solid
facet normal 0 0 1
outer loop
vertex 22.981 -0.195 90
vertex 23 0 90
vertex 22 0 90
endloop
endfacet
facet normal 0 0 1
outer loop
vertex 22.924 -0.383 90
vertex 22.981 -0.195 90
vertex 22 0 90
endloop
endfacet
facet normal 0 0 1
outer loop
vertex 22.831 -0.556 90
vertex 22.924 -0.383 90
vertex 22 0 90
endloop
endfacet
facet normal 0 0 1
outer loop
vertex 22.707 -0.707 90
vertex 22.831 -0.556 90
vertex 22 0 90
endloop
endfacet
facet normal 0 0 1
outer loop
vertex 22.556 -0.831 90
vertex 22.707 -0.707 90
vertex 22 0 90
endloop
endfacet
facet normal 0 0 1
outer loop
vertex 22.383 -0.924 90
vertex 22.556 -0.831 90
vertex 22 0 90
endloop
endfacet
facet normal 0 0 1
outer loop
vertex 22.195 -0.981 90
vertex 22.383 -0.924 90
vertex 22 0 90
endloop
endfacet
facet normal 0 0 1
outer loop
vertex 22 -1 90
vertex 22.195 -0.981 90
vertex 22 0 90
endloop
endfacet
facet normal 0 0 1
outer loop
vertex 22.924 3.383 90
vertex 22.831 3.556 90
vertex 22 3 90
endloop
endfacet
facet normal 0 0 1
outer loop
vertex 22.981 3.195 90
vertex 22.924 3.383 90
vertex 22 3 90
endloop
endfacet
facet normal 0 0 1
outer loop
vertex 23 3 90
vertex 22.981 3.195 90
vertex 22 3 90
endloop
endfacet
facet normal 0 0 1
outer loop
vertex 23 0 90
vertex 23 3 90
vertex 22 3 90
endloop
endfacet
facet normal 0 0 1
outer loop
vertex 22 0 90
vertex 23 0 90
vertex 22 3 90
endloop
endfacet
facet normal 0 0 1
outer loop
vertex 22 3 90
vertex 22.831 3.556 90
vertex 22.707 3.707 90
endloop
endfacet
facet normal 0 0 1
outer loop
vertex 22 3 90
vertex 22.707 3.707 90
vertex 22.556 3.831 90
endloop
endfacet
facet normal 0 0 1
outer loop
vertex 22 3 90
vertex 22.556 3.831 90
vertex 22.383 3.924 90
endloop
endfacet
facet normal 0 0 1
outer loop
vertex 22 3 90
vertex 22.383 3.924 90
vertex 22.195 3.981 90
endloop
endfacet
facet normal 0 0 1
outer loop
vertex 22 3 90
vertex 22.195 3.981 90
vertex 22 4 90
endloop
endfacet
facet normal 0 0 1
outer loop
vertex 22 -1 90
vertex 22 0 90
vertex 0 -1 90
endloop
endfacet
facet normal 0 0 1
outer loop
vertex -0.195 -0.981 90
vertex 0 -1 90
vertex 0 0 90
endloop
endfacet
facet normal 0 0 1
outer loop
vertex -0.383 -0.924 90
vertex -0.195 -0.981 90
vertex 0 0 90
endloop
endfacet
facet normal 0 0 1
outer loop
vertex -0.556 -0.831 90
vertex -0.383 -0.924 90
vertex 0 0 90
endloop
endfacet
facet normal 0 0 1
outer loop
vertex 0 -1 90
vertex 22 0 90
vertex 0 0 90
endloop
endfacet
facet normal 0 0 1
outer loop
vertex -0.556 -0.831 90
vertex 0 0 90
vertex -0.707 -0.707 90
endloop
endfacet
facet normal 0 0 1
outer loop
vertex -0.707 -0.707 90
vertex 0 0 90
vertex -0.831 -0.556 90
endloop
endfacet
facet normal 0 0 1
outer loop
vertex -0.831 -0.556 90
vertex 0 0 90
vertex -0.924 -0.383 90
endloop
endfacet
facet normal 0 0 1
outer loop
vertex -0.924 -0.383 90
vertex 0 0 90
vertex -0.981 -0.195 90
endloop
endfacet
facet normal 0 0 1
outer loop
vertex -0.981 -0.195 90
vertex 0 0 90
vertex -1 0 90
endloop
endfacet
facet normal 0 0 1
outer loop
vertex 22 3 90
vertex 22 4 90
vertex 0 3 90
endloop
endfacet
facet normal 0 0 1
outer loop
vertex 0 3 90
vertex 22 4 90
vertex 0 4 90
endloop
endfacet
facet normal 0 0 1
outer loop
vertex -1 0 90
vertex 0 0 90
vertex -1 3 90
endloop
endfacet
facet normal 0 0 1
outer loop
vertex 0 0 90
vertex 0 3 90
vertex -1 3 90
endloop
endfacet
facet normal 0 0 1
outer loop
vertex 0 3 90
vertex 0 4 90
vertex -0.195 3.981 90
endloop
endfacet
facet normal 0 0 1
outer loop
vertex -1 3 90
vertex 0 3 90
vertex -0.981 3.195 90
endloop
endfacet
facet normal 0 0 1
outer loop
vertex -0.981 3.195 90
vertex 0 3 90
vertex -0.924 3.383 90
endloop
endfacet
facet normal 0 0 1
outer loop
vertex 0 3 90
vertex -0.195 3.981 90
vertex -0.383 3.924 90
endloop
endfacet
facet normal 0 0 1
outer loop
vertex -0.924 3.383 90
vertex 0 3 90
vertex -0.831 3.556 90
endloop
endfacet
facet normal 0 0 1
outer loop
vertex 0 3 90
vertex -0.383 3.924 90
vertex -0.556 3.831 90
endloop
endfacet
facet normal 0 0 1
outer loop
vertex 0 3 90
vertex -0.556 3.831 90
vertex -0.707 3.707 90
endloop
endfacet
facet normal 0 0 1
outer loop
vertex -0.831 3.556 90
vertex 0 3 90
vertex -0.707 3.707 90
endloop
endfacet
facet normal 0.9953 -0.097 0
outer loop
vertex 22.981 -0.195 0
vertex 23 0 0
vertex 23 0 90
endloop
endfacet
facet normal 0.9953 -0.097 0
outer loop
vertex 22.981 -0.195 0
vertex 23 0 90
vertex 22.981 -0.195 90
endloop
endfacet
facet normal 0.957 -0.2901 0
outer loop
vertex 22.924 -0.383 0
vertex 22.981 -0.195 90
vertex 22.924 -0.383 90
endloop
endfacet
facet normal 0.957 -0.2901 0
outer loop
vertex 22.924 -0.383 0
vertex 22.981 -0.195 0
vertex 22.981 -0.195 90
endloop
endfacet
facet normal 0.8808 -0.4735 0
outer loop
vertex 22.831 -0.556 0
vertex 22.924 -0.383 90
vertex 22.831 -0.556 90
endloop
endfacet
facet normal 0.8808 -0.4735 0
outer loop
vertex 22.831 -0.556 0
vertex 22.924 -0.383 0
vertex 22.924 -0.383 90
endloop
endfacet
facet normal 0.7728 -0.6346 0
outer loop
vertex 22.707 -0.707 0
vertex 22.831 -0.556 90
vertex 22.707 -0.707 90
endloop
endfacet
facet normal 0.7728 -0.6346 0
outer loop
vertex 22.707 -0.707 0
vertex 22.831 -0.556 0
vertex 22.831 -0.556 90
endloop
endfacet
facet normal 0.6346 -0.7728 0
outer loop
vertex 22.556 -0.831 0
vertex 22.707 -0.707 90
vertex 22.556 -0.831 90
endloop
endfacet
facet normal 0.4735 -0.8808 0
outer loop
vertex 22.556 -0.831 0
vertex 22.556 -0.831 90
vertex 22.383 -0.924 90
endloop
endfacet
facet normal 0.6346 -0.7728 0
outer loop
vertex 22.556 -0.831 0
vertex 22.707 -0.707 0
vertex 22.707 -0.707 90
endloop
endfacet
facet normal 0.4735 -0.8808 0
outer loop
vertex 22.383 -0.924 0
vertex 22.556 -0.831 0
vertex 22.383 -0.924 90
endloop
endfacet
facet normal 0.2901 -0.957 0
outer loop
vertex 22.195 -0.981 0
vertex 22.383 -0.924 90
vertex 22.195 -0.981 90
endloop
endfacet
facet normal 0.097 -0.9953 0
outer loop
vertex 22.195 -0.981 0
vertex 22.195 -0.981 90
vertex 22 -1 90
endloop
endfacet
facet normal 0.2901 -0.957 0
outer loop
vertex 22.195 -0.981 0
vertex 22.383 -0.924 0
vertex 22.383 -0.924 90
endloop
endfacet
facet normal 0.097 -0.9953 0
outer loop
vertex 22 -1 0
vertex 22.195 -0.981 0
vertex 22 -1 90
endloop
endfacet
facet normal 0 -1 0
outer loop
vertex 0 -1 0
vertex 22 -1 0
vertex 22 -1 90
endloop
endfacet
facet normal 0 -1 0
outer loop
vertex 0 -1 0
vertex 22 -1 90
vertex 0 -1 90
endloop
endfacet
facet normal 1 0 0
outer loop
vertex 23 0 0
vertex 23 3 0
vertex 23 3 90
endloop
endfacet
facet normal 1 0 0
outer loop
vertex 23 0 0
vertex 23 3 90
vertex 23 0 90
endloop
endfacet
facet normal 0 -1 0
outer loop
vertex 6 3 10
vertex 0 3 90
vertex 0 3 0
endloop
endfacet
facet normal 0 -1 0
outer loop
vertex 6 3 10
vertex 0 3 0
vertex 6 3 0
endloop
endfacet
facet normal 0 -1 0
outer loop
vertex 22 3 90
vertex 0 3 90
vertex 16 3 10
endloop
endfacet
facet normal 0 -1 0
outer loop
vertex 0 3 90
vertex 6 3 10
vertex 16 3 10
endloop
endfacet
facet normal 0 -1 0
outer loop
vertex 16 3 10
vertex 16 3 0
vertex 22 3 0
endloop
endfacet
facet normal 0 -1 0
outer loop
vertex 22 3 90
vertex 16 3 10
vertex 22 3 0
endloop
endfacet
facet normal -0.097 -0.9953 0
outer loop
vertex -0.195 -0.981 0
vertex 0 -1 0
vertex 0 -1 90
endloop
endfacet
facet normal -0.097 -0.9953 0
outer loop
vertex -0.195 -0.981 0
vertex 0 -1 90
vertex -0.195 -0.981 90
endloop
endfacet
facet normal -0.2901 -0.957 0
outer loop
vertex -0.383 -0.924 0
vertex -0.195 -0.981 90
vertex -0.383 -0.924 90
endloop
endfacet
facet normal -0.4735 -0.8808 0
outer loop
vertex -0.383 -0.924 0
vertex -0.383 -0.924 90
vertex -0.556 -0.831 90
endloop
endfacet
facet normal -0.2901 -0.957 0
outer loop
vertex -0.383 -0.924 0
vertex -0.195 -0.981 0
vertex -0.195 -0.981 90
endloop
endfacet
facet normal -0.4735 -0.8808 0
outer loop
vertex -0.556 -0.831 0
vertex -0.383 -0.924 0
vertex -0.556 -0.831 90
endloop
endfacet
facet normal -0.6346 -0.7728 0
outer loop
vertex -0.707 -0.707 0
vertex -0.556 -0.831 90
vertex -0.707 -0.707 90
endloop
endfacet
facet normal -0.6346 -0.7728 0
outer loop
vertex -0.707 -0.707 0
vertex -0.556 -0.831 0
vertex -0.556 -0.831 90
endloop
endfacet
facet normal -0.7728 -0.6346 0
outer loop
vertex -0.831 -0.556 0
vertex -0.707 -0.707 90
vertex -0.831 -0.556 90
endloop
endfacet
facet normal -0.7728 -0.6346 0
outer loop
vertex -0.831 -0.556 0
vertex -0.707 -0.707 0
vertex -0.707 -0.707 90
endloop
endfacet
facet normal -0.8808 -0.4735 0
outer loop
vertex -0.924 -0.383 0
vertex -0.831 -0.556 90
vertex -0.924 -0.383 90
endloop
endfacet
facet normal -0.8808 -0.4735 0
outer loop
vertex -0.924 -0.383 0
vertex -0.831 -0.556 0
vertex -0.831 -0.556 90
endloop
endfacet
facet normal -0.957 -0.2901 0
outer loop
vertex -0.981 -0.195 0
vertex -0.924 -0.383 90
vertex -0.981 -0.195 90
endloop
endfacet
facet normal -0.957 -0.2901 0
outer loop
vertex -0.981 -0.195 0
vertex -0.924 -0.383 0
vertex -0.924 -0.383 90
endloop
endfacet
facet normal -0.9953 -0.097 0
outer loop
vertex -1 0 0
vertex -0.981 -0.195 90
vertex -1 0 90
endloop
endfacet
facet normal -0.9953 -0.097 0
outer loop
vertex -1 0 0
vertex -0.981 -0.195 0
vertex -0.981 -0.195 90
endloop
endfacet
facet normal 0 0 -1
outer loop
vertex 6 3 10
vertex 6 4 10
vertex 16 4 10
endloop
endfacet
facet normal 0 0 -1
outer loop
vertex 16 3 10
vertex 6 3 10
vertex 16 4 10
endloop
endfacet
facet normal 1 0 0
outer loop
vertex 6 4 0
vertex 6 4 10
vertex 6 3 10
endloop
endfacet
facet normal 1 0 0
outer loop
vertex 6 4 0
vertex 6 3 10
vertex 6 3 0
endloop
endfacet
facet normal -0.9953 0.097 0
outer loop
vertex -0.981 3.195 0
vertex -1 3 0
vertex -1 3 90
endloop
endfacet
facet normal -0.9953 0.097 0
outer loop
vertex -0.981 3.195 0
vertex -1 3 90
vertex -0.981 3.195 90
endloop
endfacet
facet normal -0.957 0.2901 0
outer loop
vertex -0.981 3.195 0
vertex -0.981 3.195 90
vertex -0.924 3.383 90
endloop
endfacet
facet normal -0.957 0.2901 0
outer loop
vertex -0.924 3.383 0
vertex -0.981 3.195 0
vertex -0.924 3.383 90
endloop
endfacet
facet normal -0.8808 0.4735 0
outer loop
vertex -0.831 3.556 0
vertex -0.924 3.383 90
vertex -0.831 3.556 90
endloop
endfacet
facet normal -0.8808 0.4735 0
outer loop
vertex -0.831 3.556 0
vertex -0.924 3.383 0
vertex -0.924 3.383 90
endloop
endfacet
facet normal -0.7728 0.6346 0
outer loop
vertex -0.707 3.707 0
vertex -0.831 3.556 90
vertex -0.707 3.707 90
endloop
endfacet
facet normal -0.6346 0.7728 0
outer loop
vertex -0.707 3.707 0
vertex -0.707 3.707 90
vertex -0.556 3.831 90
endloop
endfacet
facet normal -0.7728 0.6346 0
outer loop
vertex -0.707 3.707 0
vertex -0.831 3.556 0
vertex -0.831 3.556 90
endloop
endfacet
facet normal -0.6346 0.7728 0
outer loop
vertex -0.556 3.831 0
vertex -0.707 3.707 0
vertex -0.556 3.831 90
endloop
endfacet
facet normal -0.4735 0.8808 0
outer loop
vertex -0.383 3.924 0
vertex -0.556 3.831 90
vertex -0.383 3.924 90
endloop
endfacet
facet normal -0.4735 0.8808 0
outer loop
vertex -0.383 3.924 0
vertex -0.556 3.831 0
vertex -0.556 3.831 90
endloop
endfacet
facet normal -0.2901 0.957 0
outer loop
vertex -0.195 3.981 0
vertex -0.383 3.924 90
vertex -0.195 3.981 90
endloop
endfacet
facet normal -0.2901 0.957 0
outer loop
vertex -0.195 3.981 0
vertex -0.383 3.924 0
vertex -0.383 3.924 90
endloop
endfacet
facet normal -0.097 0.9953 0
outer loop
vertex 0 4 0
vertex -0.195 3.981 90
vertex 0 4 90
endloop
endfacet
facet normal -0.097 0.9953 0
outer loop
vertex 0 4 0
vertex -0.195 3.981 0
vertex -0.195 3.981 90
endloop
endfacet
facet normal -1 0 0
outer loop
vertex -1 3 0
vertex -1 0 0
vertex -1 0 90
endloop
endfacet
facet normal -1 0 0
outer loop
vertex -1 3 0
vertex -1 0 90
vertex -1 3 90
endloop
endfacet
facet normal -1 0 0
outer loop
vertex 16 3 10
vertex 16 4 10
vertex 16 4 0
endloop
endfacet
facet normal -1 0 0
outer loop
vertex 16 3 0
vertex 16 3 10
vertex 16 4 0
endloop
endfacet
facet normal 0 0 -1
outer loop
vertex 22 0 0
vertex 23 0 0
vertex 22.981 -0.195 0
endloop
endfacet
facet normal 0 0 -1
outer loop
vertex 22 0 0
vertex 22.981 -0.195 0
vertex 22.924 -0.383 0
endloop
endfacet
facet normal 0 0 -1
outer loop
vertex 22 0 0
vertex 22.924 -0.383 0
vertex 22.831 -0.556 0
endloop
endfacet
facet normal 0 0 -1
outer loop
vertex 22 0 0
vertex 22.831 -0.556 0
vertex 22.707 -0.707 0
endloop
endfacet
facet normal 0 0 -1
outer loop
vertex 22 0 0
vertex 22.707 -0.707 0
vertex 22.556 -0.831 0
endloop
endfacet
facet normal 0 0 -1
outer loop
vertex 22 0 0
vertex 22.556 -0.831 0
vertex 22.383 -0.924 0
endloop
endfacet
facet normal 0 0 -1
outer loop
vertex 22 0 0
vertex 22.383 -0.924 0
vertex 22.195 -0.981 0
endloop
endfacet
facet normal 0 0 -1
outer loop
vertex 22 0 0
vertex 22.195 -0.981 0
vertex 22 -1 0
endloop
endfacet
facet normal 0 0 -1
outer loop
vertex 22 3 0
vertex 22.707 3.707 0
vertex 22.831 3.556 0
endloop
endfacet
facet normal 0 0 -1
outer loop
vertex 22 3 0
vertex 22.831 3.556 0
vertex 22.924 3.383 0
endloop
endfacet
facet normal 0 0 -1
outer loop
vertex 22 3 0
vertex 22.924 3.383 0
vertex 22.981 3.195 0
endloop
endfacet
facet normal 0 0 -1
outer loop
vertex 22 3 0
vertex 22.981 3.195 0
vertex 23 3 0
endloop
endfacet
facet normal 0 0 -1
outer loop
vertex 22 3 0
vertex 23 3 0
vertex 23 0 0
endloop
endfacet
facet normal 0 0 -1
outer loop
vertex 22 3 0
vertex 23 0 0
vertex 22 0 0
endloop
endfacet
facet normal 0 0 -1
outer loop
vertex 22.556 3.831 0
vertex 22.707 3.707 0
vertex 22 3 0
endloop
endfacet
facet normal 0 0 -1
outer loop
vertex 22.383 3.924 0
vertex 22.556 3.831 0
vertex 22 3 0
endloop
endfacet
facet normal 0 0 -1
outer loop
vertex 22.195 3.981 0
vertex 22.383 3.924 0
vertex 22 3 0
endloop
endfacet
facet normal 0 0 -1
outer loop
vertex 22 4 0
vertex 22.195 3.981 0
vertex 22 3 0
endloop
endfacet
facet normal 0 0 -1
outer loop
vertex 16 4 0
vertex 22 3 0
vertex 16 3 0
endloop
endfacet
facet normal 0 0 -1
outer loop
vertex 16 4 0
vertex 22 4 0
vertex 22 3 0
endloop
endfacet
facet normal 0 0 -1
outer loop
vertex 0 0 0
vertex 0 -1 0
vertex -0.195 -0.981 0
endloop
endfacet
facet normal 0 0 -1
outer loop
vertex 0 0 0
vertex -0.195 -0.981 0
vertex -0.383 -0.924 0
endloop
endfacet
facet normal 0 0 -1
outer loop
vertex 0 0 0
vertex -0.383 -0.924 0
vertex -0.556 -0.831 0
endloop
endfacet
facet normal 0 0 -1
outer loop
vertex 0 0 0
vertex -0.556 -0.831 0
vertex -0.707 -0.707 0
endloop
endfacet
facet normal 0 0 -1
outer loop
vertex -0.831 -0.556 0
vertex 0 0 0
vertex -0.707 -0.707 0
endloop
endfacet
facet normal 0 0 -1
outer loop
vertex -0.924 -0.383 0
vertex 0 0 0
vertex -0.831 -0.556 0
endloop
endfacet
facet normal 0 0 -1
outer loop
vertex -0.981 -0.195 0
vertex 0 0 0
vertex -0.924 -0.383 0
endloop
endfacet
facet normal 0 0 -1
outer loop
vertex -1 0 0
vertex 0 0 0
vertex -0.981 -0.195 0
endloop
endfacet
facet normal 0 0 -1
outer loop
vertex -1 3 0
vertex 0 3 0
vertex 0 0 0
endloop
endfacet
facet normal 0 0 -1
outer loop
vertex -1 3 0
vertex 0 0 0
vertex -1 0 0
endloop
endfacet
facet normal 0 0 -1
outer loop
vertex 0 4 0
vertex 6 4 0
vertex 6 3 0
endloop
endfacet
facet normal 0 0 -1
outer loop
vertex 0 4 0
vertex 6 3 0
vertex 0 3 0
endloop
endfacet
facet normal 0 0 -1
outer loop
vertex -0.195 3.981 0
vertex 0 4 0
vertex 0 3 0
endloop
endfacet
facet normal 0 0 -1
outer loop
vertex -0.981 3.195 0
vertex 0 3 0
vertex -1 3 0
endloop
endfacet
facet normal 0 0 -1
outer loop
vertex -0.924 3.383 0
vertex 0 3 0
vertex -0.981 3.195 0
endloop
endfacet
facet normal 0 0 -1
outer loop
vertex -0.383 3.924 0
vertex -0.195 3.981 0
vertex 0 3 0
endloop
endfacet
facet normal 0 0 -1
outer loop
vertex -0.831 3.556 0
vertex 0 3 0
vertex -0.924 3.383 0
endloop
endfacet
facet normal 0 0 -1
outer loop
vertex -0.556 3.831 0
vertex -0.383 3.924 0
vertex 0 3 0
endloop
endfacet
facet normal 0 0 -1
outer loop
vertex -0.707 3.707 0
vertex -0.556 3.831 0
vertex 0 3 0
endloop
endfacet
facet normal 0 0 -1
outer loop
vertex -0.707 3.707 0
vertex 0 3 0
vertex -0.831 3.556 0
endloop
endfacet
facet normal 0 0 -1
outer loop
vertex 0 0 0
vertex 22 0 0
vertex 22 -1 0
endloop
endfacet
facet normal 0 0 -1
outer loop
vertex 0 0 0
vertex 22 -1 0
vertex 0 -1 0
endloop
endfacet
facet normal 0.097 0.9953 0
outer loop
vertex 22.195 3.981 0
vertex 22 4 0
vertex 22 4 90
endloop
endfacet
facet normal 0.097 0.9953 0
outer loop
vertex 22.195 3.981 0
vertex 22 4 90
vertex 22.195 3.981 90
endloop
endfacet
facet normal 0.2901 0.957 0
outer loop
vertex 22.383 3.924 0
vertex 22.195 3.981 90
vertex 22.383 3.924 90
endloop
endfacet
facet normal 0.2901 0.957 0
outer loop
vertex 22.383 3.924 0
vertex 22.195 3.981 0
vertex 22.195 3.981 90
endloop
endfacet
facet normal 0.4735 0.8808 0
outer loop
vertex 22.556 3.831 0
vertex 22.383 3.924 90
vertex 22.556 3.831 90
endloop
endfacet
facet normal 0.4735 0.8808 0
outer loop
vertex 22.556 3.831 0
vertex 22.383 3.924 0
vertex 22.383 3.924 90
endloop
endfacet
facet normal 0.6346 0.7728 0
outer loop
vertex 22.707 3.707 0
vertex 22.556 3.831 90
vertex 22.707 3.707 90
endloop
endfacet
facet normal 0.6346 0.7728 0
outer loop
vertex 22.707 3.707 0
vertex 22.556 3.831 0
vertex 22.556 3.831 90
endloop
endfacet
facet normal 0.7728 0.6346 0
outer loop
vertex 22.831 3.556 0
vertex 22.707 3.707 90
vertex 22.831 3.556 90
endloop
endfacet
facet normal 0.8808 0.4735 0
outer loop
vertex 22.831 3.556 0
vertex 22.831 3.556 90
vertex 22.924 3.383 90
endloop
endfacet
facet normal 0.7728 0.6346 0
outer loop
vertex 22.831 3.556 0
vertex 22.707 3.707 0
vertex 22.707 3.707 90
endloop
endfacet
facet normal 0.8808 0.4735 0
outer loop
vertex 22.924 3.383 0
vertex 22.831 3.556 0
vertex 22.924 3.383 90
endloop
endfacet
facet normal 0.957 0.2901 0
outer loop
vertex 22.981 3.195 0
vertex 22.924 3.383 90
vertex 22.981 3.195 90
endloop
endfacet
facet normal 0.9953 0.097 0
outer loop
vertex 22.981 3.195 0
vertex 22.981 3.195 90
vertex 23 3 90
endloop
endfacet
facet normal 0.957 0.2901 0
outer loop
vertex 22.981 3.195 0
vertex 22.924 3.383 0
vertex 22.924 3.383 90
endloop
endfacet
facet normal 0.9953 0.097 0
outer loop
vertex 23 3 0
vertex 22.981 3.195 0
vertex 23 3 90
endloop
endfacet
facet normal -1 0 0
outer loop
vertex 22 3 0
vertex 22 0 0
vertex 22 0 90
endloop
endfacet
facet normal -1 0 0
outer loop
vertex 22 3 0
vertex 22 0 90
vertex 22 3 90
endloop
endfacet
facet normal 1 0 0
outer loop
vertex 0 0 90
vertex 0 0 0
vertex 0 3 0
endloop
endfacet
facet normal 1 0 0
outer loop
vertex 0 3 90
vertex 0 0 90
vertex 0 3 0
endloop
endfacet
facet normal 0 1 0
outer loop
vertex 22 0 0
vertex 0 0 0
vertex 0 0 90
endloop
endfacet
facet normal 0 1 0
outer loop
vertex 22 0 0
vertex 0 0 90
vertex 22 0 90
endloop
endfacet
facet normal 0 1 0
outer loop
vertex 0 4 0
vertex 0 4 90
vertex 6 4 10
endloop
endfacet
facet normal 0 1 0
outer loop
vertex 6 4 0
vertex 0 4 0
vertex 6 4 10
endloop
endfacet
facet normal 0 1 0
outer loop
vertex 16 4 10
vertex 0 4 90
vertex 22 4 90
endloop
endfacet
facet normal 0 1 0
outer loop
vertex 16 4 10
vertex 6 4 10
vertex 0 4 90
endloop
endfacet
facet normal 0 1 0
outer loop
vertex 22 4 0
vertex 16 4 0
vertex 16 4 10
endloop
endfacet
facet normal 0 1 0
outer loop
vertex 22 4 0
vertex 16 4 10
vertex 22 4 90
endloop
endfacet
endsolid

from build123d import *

# Parameters (mm, degrees)
SKETCH_1_W          = 22
SKETCH_1_H          = 3
EXTRUDE_1_DEPTH     = 90
SKETCH_2_W          = 10
SKETCH_2_H          = 10
CUT_EXTRUDE_1_DEPTH = 1


with BuildPart() as part:
    # 草图1 → 凸台-拉伸1 (new body)
    with BuildSketch(Plane.XY):
        with BuildLine():
            Line((0, 4), (22, 4))
            ThreePointArc((22, 4), (22.707106781, 3.707106781), (23, 3))
            Line((23, 3), (23, 0))
            ThreePointArc((23, 0), (22.707106781, -0.707106781), (22, -1))
            Line((22, -1), (0, -1))
            ThreePointArc((0, -1), (-0.707106781, -0.707106781), (-1, 0))
            Line((-1, 0), (-1, 3))
            ThreePointArc((-1, 3), (-0.707106781, 3.707106781), (0, 4))
        make_face()
        with Locations((11, 1.5)):
            Rectangle(SKETCH_1_W, SKETCH_1_H, mode=Mode.SUBTRACT)
    extrude(amount=EXTRUDE_1_DEPTH)

    # 草图2 → 切除-拉伸1 (cut)
    with BuildSketch(Plane(origin=(0, 4, 0), x_dir=(1, 0, 0), z_dir=(0, 1, 0))):
        with Locations((11, -5)):
            Rectangle(SKETCH_2_W, SKETCH_2_H)
    extrude(amount=-CUT_EXTRUDE_1_DEPTH, mode=Mode.SUBTRACT)


solid = part.part
